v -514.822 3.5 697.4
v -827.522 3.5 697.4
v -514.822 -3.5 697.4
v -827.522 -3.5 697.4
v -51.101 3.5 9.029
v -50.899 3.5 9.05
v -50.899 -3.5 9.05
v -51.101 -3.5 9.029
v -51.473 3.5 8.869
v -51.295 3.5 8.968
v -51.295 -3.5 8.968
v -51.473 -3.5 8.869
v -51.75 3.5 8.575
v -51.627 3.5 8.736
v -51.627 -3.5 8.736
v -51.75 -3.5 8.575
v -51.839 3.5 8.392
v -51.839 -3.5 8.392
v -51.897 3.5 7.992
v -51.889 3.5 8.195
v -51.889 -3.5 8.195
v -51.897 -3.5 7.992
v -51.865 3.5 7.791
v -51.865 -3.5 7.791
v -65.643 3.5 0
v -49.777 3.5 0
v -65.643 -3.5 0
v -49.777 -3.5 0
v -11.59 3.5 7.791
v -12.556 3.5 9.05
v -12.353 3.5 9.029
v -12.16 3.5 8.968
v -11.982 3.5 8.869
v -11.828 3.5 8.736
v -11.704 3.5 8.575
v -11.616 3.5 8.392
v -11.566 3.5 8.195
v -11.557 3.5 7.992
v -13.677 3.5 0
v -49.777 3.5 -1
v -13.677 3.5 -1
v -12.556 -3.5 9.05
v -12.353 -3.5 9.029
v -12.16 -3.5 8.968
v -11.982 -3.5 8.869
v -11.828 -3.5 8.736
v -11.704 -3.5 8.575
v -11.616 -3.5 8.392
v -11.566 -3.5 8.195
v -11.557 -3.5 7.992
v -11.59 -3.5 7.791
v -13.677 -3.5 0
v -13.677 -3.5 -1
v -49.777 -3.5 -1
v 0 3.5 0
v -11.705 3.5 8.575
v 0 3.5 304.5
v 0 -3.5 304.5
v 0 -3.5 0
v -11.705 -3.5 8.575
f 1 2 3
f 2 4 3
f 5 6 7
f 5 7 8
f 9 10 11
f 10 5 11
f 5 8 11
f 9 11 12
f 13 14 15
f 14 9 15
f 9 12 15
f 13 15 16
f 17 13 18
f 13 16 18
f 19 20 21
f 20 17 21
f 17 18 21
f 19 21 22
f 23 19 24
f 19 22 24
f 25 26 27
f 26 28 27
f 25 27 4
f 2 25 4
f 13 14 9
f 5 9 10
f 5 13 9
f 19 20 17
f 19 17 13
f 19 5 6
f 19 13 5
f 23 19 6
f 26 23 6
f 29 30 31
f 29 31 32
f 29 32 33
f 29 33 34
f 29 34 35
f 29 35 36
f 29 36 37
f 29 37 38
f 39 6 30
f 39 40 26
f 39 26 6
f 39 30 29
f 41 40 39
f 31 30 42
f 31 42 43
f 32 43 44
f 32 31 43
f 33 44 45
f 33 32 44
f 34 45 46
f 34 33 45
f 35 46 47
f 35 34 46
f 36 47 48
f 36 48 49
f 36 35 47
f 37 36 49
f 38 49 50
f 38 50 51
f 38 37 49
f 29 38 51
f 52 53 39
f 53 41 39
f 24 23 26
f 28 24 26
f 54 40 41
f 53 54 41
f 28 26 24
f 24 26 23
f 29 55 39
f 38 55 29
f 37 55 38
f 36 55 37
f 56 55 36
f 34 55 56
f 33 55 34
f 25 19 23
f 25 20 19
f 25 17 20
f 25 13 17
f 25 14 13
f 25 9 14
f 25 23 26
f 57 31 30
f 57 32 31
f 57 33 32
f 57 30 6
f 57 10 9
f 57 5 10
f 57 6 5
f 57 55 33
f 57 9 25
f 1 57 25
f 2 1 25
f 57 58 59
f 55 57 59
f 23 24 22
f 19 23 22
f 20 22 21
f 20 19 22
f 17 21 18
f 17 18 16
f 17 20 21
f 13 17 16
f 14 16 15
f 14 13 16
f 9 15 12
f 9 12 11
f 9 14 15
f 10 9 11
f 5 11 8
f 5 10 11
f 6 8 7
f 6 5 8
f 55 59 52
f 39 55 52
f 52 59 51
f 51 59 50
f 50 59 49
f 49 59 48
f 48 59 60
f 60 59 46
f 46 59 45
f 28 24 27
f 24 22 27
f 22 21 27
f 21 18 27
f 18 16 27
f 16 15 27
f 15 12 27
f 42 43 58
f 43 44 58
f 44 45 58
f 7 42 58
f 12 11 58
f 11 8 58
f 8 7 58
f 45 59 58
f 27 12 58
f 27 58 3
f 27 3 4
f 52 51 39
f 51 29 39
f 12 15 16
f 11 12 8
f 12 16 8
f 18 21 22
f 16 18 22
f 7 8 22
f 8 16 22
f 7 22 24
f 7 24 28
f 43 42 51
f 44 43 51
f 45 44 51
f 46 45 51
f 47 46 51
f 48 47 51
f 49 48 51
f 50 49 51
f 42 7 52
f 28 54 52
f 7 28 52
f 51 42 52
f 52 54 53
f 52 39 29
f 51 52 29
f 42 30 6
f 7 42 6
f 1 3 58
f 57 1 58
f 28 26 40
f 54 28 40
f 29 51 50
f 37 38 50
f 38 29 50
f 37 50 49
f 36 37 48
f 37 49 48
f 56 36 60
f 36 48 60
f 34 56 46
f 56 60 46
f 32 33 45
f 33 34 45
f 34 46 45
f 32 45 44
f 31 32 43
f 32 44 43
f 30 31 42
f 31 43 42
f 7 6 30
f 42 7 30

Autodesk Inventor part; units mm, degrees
ref_plane "YZ Plane" through (0, 0, 0) normal (1, 0, 0) x (0, 1, 0)
ref_plane "XZ Plane" through (0, 0, 0) normal (0, 1, 0) x (-1, 0, 0)
ref_plane "XY Plane" through (0, 0, 0) normal (0, 0, 1) x (1, 0, 0)
sketch "Sketch1" plane through (0, 0, 0) normal (0, 1, 0) x (-1, 0, 0)
  line L0 (827.5224, 697.4) -> (514.8224, 697.4)
  line L1 (514.8224, 697.4) -> (0, 304.5)
  line L2 (0, 0) -> (65.6433, 0)
  line L3 (65.6433, 0) -> (827.5224, 697.4)
  line L4 (827.5224, 697.4) -> (827.5224, 0) construction
  line L5 (0, 304.5) -> (0, 691.3725) construction
  line L6 (0, 304.5) -> (0, 0)
  dimension "d0" = 312.7
  dimension "d2" = 697.4
  dimension "d4" = 52.65
  dimension "d5" = 47.53
  dimension "d8" = 304.5
extrude "Extrusion1" add sketch "Sketch1" along normal mid plane 7
sketch "Sketch2" plane through (0, 3.5, 0) normal (0, 1, 0) x (1, 0, 0)
  line L0 (-827.5224, -697.4) -> (-514.8224, -697.4) projected
  line L1 (-514.8224, -697.4) -> (0, -304.5) projected
  line L2 (0, 0) -> (-65.6433, 0) projected
  line L3 (-65.6433, 0) -> (-827.5224, -697.4) projected
  line L4 (0, 0) -> (-65.6433, 0) projected
  line L5 (-49.7774, 0) -> (-52.2024, -9.05)
  line L6 (-52.2024, -9.05) -> (-11.2524, -9.05)
  line L7 (-11.2524, -9.05) -> (-13.6773, 0)
  line L8 (-22.2224, -9.05) -> (-22.2224, 0) construction
  line L9 (-49.7774, 0) -> (-13.6773, 0)
  line L10 (0, -304.5) -> (0, 0) projected
  dimension "d9" = 75
  dimension "d10" = 75
  dimension "d11" = 9.05
  dimension "d12" = 10.97
  dimension "d13" = 805.3
  dimension "d14" = 40.95
extrude "Extrusion2" cut sketch "Sketch2" against normal through all contours L2 L7 L6 L5
fillet "Fillet1" radius 1 2 edges at (-11.2524, 0, 9.05) (-52.2024, 0, 9.05)
sketch "Sketch3" plane through (0, 3.5, 0) normal (0, 1, 0) x (1, 0, 0)
  line L0 (-51.8651, -7.7912) -> (-49.7774, 0) projected
  arc A0 (-51.8651, -7.7912) -> (-50.8991, -9.05) centre (-50.8991, -8.05) ccw projected
  line L1 (-12.5556, -9.05) -> (-50.8991, -9.05) projected
  arc A1 (-12.5556, -9.05) -> (-11.5897, -7.7912) centre (-12.5556, -8.05) ccw projected
  line L2 (-13.6773, 0) -> (-11.5897, -7.7912) projected
  line L3 (-49.7774, 0) -> (-65.6433, 0) projected
  line L4 (-49.7774, 0) -> (-49.7774, 1)
  line L5 (-49.7774, 1) -> (-13.6773, 1)
  line L6 (-11.5897, -7.7912) -> (-13.6773, 0) projected
  line L7 (-13.6773, 1) -> (-13.6773, 0)
  point P0 (0, 0)
  dimension "d18" = 1
extrude "Extrusion3" add sketch "Sketch3" against normal up to surface (7 mm away) separate body
equation "\"d0\" = botWidth"
equation "\"d2\" = height"
equation "\"d4\" = rightAngle"
equation "\"d5\" = leftAngle"
equation "\"d8\" = sideFlat"
equation "\"d13\" = dovetailDistance"
equation "\"height\" = 697.4"
equation "\"botWidth\" = 312.7"
equation "\"leftAngle\" = 47.53deg"
equation "\"rightAngle\" = 52.65deg"
equation "\"sideFlat\" = 304.5"
equation "\"dovetailDistance\" = 805.3"
properties part number "OuterHCALtile12" material "ABS Plastic"
